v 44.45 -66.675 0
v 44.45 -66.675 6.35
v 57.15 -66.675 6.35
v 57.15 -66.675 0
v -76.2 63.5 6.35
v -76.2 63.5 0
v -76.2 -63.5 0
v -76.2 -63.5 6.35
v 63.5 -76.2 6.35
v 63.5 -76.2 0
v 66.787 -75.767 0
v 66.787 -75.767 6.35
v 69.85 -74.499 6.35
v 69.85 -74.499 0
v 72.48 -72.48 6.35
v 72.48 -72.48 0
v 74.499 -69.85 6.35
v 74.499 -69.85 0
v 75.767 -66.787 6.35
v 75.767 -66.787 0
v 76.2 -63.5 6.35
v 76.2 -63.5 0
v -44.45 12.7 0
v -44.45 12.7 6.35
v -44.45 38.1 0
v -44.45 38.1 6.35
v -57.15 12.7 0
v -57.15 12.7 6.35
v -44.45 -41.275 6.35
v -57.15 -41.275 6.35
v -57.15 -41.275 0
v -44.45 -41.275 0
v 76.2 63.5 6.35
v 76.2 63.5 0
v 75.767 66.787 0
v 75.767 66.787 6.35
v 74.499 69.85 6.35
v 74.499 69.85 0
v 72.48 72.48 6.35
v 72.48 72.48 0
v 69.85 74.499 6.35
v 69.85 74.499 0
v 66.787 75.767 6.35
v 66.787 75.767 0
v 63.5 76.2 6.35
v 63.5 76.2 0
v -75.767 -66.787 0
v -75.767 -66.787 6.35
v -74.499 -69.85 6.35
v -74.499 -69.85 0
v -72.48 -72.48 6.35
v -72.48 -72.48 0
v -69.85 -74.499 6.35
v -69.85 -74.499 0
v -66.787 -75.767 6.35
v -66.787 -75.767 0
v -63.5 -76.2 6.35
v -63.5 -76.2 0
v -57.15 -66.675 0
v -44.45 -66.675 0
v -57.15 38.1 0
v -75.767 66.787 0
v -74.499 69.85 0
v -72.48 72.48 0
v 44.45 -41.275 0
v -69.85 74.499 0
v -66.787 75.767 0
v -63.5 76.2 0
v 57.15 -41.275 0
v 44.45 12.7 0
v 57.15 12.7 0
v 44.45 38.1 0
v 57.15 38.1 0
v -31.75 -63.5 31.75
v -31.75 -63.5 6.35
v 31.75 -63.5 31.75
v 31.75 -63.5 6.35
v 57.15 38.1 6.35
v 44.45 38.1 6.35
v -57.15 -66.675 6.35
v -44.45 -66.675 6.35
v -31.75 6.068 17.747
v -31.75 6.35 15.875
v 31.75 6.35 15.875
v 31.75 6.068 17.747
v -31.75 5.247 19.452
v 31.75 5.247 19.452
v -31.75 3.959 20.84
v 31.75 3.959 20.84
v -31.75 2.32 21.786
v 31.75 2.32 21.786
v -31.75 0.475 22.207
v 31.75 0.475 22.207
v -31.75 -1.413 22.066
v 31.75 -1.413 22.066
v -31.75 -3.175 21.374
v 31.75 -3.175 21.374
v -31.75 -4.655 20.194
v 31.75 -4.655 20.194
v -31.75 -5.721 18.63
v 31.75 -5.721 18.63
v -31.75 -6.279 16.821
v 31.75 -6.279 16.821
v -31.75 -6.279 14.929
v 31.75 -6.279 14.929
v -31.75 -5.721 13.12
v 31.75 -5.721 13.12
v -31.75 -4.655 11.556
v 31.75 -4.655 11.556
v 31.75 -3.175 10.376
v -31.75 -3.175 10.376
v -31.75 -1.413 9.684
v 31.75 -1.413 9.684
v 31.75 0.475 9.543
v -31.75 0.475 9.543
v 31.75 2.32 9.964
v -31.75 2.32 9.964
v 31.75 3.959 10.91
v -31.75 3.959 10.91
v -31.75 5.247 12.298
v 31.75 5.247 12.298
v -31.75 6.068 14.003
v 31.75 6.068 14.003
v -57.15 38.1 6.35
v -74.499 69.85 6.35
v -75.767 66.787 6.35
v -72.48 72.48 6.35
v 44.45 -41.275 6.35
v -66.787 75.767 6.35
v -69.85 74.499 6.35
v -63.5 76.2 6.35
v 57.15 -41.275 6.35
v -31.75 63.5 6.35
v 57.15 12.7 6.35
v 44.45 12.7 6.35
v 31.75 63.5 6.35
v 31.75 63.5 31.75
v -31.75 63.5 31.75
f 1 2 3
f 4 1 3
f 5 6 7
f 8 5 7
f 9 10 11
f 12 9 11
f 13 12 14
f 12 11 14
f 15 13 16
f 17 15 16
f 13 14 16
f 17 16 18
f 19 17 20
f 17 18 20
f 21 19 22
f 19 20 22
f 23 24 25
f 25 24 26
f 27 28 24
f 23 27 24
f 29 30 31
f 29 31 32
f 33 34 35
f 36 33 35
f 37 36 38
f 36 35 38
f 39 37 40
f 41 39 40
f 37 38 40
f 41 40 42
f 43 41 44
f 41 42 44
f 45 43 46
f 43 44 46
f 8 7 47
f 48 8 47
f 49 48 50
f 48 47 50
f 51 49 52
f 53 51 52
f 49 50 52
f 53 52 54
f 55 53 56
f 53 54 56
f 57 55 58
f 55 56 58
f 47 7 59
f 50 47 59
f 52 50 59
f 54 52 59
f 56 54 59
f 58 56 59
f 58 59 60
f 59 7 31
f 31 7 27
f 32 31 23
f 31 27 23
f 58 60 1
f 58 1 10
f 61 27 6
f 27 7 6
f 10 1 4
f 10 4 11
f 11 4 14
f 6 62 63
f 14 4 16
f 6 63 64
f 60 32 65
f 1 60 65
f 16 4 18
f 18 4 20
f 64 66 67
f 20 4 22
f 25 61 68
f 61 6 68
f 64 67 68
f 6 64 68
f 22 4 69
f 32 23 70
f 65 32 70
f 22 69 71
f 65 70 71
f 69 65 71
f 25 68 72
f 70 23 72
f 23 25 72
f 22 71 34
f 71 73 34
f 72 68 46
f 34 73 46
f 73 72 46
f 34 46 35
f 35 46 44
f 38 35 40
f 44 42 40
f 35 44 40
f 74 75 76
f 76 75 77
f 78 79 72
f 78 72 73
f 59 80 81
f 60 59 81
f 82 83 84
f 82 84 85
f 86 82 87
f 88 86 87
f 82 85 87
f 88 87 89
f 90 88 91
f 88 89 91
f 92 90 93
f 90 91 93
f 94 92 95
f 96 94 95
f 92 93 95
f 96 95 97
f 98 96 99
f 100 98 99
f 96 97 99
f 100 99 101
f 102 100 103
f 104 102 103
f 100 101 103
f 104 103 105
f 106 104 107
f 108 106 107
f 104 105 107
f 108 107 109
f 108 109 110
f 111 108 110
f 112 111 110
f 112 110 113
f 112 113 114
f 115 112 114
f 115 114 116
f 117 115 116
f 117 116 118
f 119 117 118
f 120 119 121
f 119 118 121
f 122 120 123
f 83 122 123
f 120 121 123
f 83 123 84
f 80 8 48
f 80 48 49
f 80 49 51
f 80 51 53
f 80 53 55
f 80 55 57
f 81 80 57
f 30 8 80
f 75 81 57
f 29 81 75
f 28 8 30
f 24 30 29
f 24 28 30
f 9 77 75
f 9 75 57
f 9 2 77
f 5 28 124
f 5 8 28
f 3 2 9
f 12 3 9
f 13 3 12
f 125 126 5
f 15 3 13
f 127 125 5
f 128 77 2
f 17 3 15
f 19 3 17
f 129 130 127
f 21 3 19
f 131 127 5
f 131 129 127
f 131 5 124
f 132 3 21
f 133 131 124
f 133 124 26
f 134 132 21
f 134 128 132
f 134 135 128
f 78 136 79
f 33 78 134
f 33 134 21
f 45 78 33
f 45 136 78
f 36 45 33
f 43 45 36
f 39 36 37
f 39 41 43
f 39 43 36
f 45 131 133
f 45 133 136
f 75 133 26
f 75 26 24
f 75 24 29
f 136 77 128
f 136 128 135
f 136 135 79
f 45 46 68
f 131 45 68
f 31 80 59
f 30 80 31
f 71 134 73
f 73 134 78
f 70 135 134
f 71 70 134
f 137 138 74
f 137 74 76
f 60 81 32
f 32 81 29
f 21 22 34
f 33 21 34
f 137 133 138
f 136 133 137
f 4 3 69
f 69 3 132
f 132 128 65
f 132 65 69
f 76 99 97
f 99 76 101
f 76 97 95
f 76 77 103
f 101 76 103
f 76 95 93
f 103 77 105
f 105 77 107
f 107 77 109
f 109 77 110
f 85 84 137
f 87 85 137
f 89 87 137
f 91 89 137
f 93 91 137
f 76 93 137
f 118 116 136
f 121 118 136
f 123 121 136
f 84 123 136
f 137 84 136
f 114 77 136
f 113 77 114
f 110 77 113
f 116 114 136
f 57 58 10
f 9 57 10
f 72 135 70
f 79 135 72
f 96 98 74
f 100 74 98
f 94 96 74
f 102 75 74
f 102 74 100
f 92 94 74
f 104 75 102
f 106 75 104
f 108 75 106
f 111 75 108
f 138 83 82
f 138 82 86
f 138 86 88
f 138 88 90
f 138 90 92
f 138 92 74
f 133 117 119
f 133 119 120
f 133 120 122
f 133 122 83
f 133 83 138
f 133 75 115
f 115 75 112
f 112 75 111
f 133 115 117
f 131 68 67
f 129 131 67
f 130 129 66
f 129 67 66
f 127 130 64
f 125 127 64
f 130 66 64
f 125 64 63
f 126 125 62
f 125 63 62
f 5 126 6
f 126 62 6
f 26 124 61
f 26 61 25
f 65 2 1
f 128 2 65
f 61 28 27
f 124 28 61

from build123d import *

# Parameters (mm, degrees)
F2_DEPTH = 6.35
F3_W     = 63.5
F3_H     = 127
F4_DEPTH = 25.4
F5_R     = 6.35
F6_DEPTH = 63.5
F7_W     = 12.7
F7_H     = 25.4
F8_DEPTH = 6.35


# Not quite as in the source:
# - the program builds the solid bodies; features that only make, move or delete a surface that nothing else refers to are left out


with BuildPart() as f2:
    # F0 (on Top) → F2 (new body)
    with BuildSketch(Plane.XY):
        with BuildLine():
            Line((63.5, 76.2), (-63.5, 76.2))
            ThreePointArc((-63.5, 76.2), (-72.4802561211, 72.4802561211), (-76.2, 63.5))
            Line((-76.2, 63.5), (-76.2, -63.5))
            ThreePointArc((-76.2, -63.5), (-72.4802561211, -72.4802561211), (-63.5, -76.2))
            Line((-63.5, -76.2), (63.5, -76.2))
            ThreePointArc((63.5, -76.2), (72.4802561211, -72.4802561211), (76.2, -63.5))
            Line((76.2, -63.5), (76.2, 63.5))
            ThreePointArc((76.2, 63.5), (72.4802561211, 72.4802561211), (63.5, 76.2))
        make_face()
        with BuildLine():
            ThreePointArc((-69.85, 57.15), (-66.1302561211, 66.1302561211), (-57.15, 69.85))
            Line((-57.15, 69.85), (-1.846e-07, 69.85))
            Line((-1.846e-07, 69.85), (57.15, 69.85))
            ThreePointArc((57.15, 69.85), (66.1302561211, 66.1302561211), (69.85, 57.15))
            Line((69.85, 57.15), (69.85, 0))
            Line((69.85, 0), (69.85, -57.15))
            ThreePointArc((69.85, -57.15), (66.1302561211, -66.1302561211), (57.15, -69.85))
            Line((57.15, -69.85), (0, -69.85))
            Line((0, -69.85), (-57.15, -69.85))
            ThreePointArc((-57.15, -69.85), (-66.1302561211, -66.1302561211), (-69.85, -57.15))
            Line((-69.85, -57.15), (-69.85, -1.807e-07))
            Line((-69.85, -1.807e-07), (-69.85, 57.15))
        make_face(mode=Mode.SUBTRACT)
        with BuildLine():
            ThreePointArc((69.85, 0), (49.3914086006, 49.3914087312), (-1.846e-07, 69.85))
            ThreePointArc((-1.846e-07, 69.85), (-49.3914087951, 49.3914085367), (-69.85, -1.807e-07))
            ThreePointArc((-69.85, -1.807e-07), (-49.391408602, -49.3914087298), (0, -69.85))
            ThreePointArc((0, -69.85), (49.3914086659, -49.3914086659), (69.85, 0))
        make_face()
        with BuildLine():
            Line((57.15, 69.85), (-1.846e-07, 69.85))
            ThreePointArc((-1.846e-07, 69.85), (49.3914086006, 49.3914087312), (69.85, 0))
            Line((69.85, 0), (69.85, 57.15))
            ThreePointArc((69.85, 57.15), (66.1302561211, 66.1302561211), (57.15, 69.85))
        make_face()
        with BuildLine():
            Line((-1.846e-07, 69.85), (-57.15, 69.85))
            ThreePointArc((-57.15, 69.85), (-66.1302561211, 66.1302561211), (-69.85, 57.15))
            Line((-69.85, 57.15), (-69.85, -1.807e-07))
            ThreePointArc((-69.85, -1.807e-07), (-49.3914087951, 49.3914085367), (-1.846e-07, 69.85))
        make_face()
        with BuildLine():
            Line((69.85, -57.15), (69.85, 0))
            ThreePointArc((69.85, 0), (49.3914086659, -49.3914086659), (0, -69.85))
            Line((0, -69.85), (57.15, -69.85))
            ThreePointArc((57.15, -69.85), (66.1302561211, -66.1302561211), (69.85, -57.15))
        make_face()
        with BuildLine():
            ThreePointArc((0, -69.85), (-49.391408602, -49.3914087298), (-69.85, -1.807e-07))
            Line((-69.85, -1.807e-07), (-69.85, -57.15))
            ThreePointArc((-69.85, -57.15), (-66.1302561211, -66.1302561211), (-57.15, -69.85))
            Line((-57.15, -69.85), (0, -69.85))
        make_face()
    extrude(amount=F2_DEPTH)

    # F3 (on face) → F4 (join)
    with BuildSketch(Plane.XY.offset(6.35)):
        Rectangle(F3_W, F3_H)
    extrude(amount=F4_DEPTH)

    # F5 (on face) → F6 (cut)
    with BuildSketch(Plane.YZ.offset(31.75)):
        with Locations((0, 15.875)):
            Circle(F5_R)
    extrude(amount=-F6_DEPTH, mode=Mode.SUBTRACT)

    # F7 (on face) → F8 (cut)
    with BuildSketch(Plane.XY.offset(6.35)):
        with Locations((50.8, 25.4)):
            Rectangle(F7_W, F7_H)
        with Locations((-50.8, 25.4)):
            Rectangle(F7_W, F7_H)
        with Locations((-50.8, -53.975)):
            Rectangle(F7_W, F7_H)
        with Locations((50.8, -53.975)):
            Rectangle(F7_W, F7_H)
    extrude(amount=-F8_DEPTH, mode=Mode.SUBTRACT)


solid = f2.part
